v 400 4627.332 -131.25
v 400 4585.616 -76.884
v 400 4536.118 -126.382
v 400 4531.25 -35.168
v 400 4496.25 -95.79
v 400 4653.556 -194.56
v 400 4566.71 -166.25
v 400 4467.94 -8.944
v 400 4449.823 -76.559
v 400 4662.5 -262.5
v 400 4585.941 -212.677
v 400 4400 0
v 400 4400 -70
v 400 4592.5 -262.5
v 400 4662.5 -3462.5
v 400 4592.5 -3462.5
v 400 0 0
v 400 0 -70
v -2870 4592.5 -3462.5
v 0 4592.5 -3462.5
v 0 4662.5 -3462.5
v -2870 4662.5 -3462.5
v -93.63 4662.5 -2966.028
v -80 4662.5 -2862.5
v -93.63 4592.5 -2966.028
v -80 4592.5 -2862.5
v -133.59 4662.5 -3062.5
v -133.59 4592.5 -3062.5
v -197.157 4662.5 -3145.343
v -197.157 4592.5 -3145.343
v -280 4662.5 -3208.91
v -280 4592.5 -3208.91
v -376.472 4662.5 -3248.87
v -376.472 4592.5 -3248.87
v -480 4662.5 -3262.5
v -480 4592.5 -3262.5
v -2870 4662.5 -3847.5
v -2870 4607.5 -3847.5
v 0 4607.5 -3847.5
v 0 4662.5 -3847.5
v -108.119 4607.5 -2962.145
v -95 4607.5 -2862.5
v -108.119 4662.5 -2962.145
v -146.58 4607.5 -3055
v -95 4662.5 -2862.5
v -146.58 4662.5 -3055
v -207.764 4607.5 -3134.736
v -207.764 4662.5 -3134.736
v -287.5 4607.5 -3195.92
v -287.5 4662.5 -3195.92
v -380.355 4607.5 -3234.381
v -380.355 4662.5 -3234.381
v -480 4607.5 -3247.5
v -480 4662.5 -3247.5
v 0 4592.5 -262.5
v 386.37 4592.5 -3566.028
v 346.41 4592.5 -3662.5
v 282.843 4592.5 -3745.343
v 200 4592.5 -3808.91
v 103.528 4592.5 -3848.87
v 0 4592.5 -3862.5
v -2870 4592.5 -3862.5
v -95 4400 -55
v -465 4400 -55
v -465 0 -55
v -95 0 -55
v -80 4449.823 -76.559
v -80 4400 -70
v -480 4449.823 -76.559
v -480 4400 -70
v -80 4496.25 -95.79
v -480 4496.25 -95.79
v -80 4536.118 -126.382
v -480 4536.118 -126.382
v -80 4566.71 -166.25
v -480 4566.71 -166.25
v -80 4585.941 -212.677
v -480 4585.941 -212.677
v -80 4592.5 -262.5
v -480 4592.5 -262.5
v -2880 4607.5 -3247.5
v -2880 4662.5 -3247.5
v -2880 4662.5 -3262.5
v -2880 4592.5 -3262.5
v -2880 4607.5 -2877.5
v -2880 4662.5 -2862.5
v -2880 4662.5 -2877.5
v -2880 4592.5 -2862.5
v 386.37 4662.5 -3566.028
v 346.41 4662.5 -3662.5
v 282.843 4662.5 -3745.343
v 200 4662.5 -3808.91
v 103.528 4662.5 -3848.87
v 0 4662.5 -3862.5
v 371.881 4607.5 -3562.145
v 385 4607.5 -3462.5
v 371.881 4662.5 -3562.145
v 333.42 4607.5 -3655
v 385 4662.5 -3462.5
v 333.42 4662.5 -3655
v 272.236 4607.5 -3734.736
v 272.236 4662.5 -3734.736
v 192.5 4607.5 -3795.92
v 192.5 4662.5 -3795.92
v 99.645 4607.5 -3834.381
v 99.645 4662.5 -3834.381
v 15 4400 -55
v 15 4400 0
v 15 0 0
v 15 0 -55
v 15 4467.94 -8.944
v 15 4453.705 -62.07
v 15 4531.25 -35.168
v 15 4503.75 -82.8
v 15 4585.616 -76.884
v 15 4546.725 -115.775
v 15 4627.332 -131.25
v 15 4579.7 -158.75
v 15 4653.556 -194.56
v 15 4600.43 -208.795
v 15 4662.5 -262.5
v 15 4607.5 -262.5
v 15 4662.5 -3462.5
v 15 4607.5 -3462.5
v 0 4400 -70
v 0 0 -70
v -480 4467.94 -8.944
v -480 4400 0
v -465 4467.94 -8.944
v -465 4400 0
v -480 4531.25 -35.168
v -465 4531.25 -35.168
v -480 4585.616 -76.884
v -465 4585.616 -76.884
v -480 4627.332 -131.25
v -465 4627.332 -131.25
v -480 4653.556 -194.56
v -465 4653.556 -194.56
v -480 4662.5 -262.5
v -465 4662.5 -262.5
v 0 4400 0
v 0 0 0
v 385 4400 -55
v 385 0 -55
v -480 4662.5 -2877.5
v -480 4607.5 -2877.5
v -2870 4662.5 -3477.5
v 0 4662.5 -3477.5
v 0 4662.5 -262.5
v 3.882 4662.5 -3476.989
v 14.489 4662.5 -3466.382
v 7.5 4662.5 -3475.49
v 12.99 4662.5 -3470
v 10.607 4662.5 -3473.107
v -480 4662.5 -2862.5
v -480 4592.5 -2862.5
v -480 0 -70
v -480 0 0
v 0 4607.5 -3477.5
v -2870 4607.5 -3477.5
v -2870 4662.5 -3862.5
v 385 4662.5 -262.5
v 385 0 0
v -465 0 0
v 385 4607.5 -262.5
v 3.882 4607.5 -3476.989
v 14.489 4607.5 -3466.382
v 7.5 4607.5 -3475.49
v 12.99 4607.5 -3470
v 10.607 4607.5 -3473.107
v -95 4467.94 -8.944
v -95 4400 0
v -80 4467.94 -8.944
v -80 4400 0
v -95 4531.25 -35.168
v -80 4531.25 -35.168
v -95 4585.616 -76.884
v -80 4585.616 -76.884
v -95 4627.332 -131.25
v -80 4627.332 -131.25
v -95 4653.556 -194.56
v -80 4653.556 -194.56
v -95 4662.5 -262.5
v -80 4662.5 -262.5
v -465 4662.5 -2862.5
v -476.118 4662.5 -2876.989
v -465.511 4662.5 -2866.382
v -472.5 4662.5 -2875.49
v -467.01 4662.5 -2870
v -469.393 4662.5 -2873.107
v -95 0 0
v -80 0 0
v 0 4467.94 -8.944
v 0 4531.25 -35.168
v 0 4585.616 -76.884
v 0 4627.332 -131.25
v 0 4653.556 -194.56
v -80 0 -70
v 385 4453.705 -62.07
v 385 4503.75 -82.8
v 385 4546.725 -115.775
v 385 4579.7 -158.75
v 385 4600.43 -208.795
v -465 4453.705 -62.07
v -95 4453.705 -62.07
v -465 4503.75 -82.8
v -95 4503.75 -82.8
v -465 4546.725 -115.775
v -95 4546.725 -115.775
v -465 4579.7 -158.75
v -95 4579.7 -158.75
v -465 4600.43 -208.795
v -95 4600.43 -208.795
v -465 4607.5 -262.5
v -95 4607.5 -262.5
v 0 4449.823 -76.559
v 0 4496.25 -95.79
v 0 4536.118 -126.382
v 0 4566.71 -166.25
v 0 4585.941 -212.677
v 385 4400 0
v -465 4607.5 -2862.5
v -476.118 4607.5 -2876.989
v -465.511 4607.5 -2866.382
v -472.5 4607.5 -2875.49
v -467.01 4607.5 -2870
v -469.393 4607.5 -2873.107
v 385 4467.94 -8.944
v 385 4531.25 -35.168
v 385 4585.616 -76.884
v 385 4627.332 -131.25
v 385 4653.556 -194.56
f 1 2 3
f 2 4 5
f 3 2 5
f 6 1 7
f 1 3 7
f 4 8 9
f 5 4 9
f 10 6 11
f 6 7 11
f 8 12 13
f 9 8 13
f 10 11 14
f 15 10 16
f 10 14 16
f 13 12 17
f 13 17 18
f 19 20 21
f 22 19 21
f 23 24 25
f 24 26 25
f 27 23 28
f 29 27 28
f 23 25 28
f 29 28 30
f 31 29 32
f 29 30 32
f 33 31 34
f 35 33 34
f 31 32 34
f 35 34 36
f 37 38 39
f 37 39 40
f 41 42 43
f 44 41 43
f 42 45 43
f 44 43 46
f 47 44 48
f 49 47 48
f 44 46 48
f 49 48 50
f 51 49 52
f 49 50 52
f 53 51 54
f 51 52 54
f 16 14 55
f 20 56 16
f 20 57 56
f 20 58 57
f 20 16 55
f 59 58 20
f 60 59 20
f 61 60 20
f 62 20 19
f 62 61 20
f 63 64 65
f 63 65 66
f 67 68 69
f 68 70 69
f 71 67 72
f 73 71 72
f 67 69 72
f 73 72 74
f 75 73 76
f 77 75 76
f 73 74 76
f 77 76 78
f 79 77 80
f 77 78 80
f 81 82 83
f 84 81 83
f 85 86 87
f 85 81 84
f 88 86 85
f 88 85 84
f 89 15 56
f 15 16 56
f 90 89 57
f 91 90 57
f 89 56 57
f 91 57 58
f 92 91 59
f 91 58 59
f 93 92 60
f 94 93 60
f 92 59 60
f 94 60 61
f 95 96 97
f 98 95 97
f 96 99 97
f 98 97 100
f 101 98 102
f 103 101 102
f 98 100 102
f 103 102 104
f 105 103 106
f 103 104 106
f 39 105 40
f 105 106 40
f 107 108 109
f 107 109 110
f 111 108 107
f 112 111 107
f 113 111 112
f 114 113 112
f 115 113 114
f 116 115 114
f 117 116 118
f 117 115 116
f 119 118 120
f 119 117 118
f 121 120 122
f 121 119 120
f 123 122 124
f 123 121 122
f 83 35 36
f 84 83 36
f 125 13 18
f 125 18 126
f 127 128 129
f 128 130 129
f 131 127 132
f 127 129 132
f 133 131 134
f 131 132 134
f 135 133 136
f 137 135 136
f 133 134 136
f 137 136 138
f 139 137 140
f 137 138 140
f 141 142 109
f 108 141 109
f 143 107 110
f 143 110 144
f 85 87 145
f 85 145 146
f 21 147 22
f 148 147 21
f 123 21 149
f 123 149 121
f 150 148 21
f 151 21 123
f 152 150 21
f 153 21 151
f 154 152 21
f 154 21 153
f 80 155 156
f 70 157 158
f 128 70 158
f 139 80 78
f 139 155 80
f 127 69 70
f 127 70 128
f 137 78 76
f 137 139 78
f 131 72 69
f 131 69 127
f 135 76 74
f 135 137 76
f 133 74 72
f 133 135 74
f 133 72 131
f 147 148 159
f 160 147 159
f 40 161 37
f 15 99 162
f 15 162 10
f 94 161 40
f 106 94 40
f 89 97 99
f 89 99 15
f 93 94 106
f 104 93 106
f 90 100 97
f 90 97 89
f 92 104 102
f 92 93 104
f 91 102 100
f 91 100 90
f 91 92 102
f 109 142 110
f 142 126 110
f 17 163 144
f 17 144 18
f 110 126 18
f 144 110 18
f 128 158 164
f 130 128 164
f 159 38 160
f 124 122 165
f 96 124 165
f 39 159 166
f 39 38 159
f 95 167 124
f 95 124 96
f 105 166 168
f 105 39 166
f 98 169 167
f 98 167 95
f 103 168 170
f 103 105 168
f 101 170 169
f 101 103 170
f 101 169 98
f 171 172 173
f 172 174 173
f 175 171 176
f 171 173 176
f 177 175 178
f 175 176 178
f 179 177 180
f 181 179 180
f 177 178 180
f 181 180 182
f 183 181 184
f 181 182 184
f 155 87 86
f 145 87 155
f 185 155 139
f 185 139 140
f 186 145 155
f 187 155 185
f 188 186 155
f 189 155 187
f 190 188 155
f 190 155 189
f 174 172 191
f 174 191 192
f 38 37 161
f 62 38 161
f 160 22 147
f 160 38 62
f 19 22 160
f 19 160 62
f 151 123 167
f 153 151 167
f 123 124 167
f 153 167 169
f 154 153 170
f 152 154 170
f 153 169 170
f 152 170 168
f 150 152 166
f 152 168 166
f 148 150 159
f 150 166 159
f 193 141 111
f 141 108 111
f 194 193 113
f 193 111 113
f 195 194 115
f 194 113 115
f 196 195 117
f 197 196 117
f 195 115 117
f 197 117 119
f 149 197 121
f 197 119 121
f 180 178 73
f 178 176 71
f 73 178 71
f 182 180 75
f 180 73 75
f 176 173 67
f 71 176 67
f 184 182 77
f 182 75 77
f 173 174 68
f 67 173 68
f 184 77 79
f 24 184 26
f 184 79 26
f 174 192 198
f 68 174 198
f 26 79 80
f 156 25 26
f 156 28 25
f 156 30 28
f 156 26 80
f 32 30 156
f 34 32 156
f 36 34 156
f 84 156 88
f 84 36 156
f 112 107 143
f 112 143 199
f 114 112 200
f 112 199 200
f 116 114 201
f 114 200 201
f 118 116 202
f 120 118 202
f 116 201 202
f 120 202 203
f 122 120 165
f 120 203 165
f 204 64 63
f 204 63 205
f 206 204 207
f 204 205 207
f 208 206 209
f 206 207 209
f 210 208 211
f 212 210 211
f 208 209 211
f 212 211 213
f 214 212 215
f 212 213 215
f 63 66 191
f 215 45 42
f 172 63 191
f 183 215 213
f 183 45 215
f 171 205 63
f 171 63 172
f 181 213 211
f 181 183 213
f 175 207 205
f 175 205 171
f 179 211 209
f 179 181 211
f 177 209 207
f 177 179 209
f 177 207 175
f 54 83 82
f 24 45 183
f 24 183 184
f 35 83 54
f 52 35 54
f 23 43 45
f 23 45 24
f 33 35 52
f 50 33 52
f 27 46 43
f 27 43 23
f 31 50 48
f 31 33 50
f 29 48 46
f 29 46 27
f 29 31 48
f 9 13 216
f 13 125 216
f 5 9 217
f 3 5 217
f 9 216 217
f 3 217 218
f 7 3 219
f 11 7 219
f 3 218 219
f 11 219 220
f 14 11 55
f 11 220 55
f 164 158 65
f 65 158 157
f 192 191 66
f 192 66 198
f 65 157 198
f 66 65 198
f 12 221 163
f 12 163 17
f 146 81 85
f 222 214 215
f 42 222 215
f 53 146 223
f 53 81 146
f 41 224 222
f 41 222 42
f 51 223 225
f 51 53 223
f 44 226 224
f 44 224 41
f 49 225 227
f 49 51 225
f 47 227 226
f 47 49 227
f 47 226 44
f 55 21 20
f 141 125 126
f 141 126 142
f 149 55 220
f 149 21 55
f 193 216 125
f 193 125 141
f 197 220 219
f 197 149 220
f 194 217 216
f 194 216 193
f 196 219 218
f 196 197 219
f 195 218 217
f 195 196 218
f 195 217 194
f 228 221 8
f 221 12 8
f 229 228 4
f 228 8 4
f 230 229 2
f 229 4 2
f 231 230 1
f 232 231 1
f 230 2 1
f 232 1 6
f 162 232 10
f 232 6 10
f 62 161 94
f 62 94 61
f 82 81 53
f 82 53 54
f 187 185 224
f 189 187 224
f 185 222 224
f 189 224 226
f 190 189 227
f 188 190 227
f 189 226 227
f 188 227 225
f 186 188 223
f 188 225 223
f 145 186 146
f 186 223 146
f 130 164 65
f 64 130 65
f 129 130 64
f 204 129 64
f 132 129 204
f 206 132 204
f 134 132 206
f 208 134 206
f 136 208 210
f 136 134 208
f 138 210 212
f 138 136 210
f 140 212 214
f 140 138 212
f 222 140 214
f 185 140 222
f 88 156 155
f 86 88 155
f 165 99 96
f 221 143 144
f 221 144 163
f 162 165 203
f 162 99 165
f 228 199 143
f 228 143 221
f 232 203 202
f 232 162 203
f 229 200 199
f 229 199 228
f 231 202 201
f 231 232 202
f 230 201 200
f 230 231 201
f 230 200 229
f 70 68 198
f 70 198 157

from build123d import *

# Parameters (mm, degrees)
SALIENTE_EXTRUIR1_DEPTH   = 1000
SALIENTE_EXTRUIR1_2_DEPTH = 1000


with BuildPart() as part:
    # Croquis1 → Saliente-Extruir1 (new body)
    with BuildSketch(Plane(origin=(0, 0, 0), x_dir=(1, 0, 0), z_dir=(0, 1, 0))):
        Polygon((-465, 0), (-465, 55), (-95, 55), (-95, 0), (-80, 0), (-80, 70), (-480, 70), (-480, 0), align=None)
    extrude(amount=SALIENTE_EXTRUIR1_DEPTH)

    # Barrer1: sweep along a curve in space
    with BuildLine() as barrer1_path:
        Line((-280, 1000, -62.5), (-280, 4400, -62.5))
        ThreePointArc((-280, 4400, -62.5), (-280, 4541.421356237, -121.078643763), (-280, 4600, -262.5))
        Line((-280, 4600, -262.5), (-280, 4600, -2862.5))
        ThreePointArc((-280, 4600, -2862.5), (-338.578643763, 4600, -3003.921356237), (-480, 4600, -3062.5))
        Line((-480, 4600, -3062.5), (-2880, 4600, -3062.5))
    # Croquis3 → Barrer1 (sweep)
    with BuildSketch(Plane(origin=(0, 1000, 0), x_dir=(1, 0, 0), z_dir=(0, 1, 0))):
        Polygon((-465, 0), (-465, 55), (-95, 55), (-95, 0), (-80, 0), (-80, 70), (-480, 70), (-480, 0), align=None)
    sweep(path=barrer1_path.line)


with BuildPart() as body_2:
    # Croquis1 → Saliente-Extruir1 2 (new body)
    with BuildSketch(Plane(origin=(0, 0, 0), x_dir=(1, 0, 0), z_dir=(0, 1, 0))):
        Polygon((0, 0), (15, 0), (15, 55), (385, 55), (385, 0), (400, 0), (400, 70), (0, 70), align=None)
    extrude(amount=SALIENTE_EXTRUIR1_2_DEPTH)

    # Barrer2: sweep along a curve in space
    with BuildLine() as barrer2_path:
        Line((200, 1000, -62.5), (200, 4400, -62.5))
        ThreePointArc((200, 4400, -62.5), (200, 4541.421356237, -121.078643763), (200, 4600, -262.5))
        Line((200, 4600, -262.5), (200, 4600, -3462.5))
        ThreePointArc((200, 4600, -3462.5), (141.421356237, 4600, -3603.921356237), (0, 4600, -3662.5))
        Line((0, 4600, -3662.5), (-2870, 4600, -3662.5))
    # Croquis4 → Barrer2 (sweep)
    with BuildSketch(Plane(origin=(0, 1000, 0), x_dir=(1, 0, 0), z_dir=(0, 1, 0))):
        Polygon((15, 0), (15, 55), (385, 55), (385, 0), (400, 0), (400, 70), (0, 70), (0, 0), align=None)
    sweep(path=barrer2_path.line)


solid = Compound([part.part, body_2.part])
